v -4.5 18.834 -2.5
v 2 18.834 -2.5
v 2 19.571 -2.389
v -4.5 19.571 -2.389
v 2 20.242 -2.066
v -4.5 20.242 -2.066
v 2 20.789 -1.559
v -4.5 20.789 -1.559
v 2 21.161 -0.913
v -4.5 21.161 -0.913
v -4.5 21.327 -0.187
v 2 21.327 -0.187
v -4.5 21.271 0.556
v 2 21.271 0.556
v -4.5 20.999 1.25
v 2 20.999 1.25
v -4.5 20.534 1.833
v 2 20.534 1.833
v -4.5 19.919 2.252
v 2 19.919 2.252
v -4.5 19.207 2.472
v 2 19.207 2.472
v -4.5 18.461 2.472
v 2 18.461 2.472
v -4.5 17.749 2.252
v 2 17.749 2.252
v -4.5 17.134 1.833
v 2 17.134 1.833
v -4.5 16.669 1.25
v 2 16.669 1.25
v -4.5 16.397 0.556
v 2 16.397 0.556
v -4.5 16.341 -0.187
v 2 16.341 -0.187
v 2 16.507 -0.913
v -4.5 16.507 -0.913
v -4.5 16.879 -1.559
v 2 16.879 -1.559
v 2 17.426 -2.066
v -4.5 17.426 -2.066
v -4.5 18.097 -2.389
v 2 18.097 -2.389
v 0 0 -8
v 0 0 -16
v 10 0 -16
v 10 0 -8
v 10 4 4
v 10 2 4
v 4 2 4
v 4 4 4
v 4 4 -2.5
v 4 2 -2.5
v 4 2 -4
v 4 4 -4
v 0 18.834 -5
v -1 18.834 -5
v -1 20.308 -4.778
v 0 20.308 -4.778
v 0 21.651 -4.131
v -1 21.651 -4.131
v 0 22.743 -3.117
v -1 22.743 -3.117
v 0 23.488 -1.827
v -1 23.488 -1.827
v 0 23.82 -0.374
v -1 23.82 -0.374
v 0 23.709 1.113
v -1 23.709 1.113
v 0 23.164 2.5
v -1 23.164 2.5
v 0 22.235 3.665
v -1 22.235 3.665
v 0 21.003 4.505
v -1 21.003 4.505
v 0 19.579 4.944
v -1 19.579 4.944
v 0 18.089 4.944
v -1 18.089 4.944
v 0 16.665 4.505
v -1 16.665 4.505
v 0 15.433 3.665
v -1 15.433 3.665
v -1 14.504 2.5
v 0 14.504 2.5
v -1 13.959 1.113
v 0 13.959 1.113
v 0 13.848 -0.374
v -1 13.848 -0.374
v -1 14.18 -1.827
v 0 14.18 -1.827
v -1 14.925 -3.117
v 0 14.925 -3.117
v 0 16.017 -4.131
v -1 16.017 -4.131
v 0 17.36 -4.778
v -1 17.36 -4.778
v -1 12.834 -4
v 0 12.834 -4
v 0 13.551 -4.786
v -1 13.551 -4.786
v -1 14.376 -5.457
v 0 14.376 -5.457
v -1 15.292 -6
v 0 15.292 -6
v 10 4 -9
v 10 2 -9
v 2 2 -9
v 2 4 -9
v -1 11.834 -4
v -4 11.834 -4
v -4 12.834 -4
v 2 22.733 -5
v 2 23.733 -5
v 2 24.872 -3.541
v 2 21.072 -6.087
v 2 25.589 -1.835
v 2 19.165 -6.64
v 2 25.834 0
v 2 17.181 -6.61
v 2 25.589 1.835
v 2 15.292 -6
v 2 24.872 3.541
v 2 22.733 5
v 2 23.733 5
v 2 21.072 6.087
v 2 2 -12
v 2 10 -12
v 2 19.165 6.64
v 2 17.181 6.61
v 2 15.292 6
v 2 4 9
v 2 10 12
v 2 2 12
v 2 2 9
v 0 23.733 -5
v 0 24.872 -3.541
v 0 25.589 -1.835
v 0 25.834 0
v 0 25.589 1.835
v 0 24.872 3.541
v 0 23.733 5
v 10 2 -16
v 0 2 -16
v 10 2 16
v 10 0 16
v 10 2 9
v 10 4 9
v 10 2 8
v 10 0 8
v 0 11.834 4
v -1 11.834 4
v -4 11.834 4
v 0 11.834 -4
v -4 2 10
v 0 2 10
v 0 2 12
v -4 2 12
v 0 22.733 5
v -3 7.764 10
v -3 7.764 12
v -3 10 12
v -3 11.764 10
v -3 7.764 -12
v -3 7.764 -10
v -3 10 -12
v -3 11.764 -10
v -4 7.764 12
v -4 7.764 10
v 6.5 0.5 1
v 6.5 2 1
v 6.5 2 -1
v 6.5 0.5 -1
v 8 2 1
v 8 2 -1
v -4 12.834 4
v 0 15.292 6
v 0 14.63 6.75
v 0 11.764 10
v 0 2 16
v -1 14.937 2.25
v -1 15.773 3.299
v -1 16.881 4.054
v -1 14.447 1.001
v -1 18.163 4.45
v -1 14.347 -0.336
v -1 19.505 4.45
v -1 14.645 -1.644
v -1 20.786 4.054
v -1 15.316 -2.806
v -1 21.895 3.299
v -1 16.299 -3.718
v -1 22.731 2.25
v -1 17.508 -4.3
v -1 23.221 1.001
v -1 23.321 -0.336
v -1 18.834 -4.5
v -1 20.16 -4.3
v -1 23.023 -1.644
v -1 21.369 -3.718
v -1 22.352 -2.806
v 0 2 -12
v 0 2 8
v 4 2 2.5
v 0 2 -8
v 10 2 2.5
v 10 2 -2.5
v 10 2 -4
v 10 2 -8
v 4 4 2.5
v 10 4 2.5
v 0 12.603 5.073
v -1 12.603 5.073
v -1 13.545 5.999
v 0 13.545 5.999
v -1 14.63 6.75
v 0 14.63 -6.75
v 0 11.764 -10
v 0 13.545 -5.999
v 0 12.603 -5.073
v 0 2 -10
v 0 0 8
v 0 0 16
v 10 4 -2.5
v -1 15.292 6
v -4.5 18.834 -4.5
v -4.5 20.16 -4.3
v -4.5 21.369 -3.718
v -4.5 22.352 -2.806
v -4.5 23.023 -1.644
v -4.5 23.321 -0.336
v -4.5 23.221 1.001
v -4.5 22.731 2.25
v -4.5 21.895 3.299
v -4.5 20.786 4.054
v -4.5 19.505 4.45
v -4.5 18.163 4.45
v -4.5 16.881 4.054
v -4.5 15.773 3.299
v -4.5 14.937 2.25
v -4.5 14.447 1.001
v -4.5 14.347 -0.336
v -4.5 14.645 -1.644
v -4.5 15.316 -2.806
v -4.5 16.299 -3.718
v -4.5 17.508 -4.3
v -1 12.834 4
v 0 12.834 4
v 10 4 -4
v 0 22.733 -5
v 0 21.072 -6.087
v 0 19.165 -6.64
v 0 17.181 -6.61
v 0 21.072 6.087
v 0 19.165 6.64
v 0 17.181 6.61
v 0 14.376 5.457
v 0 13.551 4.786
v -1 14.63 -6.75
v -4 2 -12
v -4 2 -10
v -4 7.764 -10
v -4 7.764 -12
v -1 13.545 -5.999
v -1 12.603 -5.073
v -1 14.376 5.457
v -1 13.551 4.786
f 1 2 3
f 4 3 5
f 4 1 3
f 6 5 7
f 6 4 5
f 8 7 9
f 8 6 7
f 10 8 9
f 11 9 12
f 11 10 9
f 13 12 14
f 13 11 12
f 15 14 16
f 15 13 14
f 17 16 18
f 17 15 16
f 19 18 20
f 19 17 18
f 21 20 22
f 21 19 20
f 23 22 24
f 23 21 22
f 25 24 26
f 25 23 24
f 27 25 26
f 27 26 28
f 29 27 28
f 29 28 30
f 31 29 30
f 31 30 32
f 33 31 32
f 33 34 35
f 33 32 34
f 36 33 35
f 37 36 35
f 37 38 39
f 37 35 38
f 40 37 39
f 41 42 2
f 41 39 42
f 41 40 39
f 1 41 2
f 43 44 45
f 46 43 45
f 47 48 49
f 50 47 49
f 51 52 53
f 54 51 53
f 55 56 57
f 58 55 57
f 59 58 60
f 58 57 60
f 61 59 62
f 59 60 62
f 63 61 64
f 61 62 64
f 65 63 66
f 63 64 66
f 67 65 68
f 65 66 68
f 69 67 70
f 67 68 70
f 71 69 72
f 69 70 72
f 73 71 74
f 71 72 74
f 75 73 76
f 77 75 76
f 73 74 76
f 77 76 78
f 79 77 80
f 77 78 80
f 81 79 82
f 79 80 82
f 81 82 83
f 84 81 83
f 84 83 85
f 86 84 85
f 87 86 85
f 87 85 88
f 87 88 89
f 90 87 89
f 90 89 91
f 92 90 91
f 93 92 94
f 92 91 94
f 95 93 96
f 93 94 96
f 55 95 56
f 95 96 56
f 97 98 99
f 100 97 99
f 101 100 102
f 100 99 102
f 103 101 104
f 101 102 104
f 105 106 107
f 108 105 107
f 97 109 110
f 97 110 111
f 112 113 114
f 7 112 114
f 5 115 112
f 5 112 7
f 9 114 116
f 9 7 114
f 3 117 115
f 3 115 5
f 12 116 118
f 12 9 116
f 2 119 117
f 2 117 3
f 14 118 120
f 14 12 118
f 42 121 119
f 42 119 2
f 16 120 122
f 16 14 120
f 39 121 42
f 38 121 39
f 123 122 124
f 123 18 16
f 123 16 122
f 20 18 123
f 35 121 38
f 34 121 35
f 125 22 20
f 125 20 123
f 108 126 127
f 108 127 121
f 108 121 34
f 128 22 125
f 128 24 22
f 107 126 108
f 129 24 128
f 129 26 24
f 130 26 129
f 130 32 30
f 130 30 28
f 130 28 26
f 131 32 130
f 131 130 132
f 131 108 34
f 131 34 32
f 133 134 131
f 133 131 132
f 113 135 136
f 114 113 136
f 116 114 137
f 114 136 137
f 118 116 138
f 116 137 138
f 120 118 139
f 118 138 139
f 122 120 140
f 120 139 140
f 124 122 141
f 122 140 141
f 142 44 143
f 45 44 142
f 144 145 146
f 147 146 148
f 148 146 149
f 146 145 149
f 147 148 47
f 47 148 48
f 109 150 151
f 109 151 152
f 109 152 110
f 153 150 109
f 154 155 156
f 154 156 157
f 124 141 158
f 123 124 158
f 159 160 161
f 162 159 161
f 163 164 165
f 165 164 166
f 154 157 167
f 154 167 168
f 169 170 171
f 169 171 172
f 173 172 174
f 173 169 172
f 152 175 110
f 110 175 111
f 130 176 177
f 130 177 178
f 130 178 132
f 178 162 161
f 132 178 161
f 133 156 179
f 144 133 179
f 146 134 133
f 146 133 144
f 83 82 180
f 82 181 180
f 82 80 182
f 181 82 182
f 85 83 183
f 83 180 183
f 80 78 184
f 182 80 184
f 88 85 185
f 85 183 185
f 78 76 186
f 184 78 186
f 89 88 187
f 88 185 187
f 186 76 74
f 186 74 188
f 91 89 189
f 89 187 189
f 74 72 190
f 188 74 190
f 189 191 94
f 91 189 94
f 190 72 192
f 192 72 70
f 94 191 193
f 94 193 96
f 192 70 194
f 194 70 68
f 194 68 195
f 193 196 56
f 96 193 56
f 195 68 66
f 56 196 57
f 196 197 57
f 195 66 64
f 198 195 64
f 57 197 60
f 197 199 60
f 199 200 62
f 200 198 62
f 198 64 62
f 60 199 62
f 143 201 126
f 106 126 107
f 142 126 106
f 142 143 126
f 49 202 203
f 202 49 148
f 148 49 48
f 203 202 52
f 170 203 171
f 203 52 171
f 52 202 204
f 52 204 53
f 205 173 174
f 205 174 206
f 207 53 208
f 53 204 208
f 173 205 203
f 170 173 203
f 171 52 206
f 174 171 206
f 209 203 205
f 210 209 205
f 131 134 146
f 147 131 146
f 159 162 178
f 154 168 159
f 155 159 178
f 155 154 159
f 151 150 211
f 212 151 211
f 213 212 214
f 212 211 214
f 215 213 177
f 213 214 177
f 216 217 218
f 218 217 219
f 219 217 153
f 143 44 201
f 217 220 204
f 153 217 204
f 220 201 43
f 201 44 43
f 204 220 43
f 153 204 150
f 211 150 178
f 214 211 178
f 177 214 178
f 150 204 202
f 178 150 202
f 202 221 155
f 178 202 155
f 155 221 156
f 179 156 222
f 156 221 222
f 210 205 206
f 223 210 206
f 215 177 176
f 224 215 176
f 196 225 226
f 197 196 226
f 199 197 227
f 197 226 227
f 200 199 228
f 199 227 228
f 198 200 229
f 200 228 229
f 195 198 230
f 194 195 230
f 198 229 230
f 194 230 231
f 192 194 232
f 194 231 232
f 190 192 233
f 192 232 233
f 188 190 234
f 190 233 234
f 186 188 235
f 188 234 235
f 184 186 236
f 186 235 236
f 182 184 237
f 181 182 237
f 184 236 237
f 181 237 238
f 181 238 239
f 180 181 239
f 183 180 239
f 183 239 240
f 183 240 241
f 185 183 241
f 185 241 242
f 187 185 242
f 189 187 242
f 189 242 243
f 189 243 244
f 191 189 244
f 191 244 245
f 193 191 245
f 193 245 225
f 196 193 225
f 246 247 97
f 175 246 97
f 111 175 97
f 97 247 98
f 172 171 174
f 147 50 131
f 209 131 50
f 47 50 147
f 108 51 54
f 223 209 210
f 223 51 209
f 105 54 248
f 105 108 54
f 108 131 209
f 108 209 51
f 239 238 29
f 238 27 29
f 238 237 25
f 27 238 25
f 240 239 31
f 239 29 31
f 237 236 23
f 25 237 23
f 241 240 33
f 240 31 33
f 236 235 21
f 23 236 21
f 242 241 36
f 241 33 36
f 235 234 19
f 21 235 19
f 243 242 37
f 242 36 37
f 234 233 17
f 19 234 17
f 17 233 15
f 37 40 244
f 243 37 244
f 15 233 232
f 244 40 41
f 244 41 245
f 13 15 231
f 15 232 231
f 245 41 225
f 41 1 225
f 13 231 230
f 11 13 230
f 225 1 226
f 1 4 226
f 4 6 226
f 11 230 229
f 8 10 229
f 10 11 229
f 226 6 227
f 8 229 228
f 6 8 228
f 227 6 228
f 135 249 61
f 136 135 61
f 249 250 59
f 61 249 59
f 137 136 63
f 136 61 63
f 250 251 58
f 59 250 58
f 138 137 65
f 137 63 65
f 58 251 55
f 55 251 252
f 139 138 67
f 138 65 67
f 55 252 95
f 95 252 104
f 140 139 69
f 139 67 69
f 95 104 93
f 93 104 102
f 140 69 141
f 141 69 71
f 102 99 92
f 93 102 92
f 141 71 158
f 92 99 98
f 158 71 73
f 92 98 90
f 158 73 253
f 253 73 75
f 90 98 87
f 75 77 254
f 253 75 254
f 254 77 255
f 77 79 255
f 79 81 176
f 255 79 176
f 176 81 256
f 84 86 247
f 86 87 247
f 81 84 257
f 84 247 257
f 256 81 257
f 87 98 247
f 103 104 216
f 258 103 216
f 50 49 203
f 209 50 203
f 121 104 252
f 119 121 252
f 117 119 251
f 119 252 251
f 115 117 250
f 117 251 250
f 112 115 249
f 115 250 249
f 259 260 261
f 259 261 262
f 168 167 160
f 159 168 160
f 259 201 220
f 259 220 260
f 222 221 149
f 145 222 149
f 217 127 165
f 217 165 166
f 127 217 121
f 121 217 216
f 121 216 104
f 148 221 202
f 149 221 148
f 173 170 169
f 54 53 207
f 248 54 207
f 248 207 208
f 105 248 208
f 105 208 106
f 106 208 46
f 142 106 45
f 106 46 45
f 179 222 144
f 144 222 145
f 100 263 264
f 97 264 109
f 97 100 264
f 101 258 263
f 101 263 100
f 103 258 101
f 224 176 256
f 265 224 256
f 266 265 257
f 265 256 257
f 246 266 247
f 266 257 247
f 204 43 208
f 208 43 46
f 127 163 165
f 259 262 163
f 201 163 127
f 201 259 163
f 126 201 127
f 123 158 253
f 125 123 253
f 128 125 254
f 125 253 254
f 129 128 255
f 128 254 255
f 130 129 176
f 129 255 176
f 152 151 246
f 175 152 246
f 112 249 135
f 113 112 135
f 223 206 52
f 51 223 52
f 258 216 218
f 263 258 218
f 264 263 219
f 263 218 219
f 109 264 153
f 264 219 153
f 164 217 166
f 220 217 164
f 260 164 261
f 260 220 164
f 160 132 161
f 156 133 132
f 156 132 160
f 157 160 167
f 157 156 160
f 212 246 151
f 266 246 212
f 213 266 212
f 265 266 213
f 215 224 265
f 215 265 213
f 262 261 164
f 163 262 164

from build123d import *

# Parameters (mm, degrees)
SCHIZZO2_W                     = 10
SCHIZZO2_H                     = 8
ESTRUSIONE_ESTRUSIONE1_DEPTH   = 2
ESTRUSIONE_ESTRUSIONE1_2_DEPTH = 2
ESTRUSIONE_ESTRUSIONE2_DEPTH   = 2
ESTRUSIONE_ESTRUSIONE3_DEPTH   = 26
TAGLIO_ESTRUSIONE1_DEPTH       = 34.763886032
TAGLIO_ESTRUSIONE1_DEPTH_BACK  = 34.763886032
TAGLIO_ESTRUSIONE2_DEPTH       = 32.990517073
TAGLIO_ESTRUSIONE2_DEPTH_BACK  = 32.990517073
SCHIZZO8_R                     = 2.5
ESTRUSIONE_ESTRUSIONE4_DEPTH   = 1
SCHIZZO11_W                    = 8
SCHIZZO11_H                    = 1
ESTRUSIONE_ESTRUSIONE5_DEPTH   = 4
ESTRUSIONE_ESTRUSIONE6_START   = -4.5
SCHIZZO12_R                    = 4.5
SCHIZZO12_R_2                  = 2.5
ESTRUSIONE_ESTRUSIONE6_DEPTH   = 4.5
ESTRUSIONE_ESTRUSIONE7_START   = -1
SCHIZZO13_R                    = 5
SCHIZZO13_R_2                  = 4.5
ESTRUSIONE_ESTRUSIONE7_DEPTH   = 1
TAGLIO_ESTRUSIONE3_START       = 12
SCHIZZO14_W                    = 1
SCHIZZO14_H                    = 4
TAGLIO_ESTRUSIONE3_DEPTH       = 44.990517073
ESTRUSIONE_ESTRUSIONE8_DEPTH   = 1


with BuildPart() as part:
    # Schizzo2 → Estrusione-Estrusione1 (new body)
    with BuildSketch(Plane(origin=(0, 0, 0), x_dir=(1, 0, 0), z_dir=(0, 1, 0))):
        with Locations((5, 12)):
            Rectangle(SCHIZZO2_W, SCHIZZO2_H)
    extrude(amount=ESTRUSIONE_ESTRUSIONE1_DEPTH)



with BuildPart() as body_2:
    # Schizzo2 → Estrusione-Estrusione1 2 (new body)
    with BuildSketch(Plane(origin=(0, 0, 0), x_dir=(1, 0, 0), z_dir=(0, 1, 0))):
        with Locations((5, -12)):
            Rectangle(SCHIZZO2_W, SCHIZZO2_H)
    extrude(amount=ESTRUSIONE_ESTRUSIONE1_2_DEPTH)


with BuildPart() as part_1:
    add(part.part)

    add(body_2.part)  # Estrusione-Estrusione2 merges body 2
    # Schizzo3 → Estrusione-Estrusione2 (add)
    with BuildSketch(Plane(origin=(0, 2, 0), x_dir=(1, 0, 0), z_dir=(0, 1, 0))):
        Polygon((0, -9), (10, -9), (10, -4), (4, -4), (4, -2.5), (10, -2.5), (10, 2.5), (4, 2.5), (4, 4), (10, 4), (10, 9), (0, 9), align=None)
    extrude(amount=ESTRUSIONE_ESTRUSIONE2_DEPTH)

    # Schizzo5 → Estrusione-Estrusione3 (add)
    with BuildSketch(Plane(origin=(0, 2, 0), x_dir=(1, 0, 0), z_dir=(0, 1, 0))):
        Polygon((-4, 12), (2, 12), (2, -12), (-4, -12), (-4, -10), (0, -10), (0, 10), (-4, 10), align=None)
    extrude(amount=ESTRUSIONE_ESTRUSIONE3_DEPTH)

    # Schizzo6 → Taglio-Estrusione1 (cut, two sides: drawn at the far end of the back side and taken through both)
    with BuildSketch(Plane(origin=(0, 0, 0), x_dir=(0, 0, -1), z_dir=(1, 0, 0)).offset(-TAGLIO_ESTRUSIONE1_DEPTH_BACK)):
        with BuildLine():
            Line((-12, 10), (-12, 28))
            Line((-12, 28), (12, 28))
            Line((12, 28), (12, 10))
            Line((12, 10), (6, 15.291502622))
            ThreePointArc((6, 15.291502622), (6.640310502, 19.165456154), (5, 22.732933549))
            Line((5, 22.732933549), (5, 23.732933549))
            ThreePointArc((5, 23.732933549), (0, 25.833954064), (-5, 23.732933549))
            Line((-5, 23.732933549), (-5, 22.732933549))
            ThreePointArc((-5, 22.732933549), (-6.640310502, 19.165456154), (-6, 15.291502622))
            Line((-6, 15.291502622), (-12, 10))
        make_face()
    extrude(amount=TAGLIO_ESTRUSIONE1_DEPTH + TAGLIO_ESTRUSIONE1_DEPTH_BACK, mode=Mode.SUBTRACT)

    # Schizzo8 → Taglio-Estrusione2 (cut, two sides: drawn at the far end of the back side and taken through both)
    with BuildSketch(Plane(origin=(0, 0, 0), x_dir=(0, 0, -1), z_dir=(1, 0, 0)).offset(-TAGLIO_ESTRUSIONE2_DEPTH_BACK)):
        with Locations((0, 18.833954064)):
            Circle(SCHIZZO8_R)
    extrude(amount=TAGLIO_ESTRUSIONE2_DEPTH + TAGLIO_ESTRUSIONE2_DEPTH_BACK, mode=Mode.SUBTRACT)

    # Schizzo9 → Estrusione-Estrusione4 (add, symmetric)
    with BuildSketch(Plane.XY):
        Polygon((8, 2), (6.5, 2), (6.5, 0.5), align=None)
    extrude(amount=ESTRUSIONE_ESTRUSIONE4_DEPTH, both=True)

    # Schizzo11 → Estrusione-Estrusione5 (add)
    with BuildSketch(Plane(origin=(0, 0, 0), x_dir=(0, 0, -1), z_dir=(1, 0, 0))):
        with Locations((0, 12.333954064)):
            Rectangle(SCHIZZO11_W, SCHIZZO11_H)
    extrude(amount=-ESTRUSIONE_ESTRUSIONE5_DEPTH)

    # Schizzo12 → Estrusione-Estrusione6 (add)
    with BuildSketch(Plane(origin=(0, 0, 0), x_dir=(0, 0, -1), z_dir=(1, 0, 0)).offset(ESTRUSIONE_ESTRUSIONE6_START)):
        with Locations((0, 18.833954064)):
            Circle(SCHIZZO12_R)
        with Locations((0, 18.833954064)):
            Circle(SCHIZZO12_R_2, mode=Mode.SUBTRACT)
    extrude(amount=ESTRUSIONE_ESTRUSIONE6_DEPTH)

    # Schizzo13 → Estrusione-Estrusione7 (add)
    with BuildSketch(Plane(origin=(0, 0, 0), x_dir=(0, 0, -1), z_dir=(1, 0, 0)).offset(ESTRUSIONE_ESTRUSIONE7_START)):
        with Locations((0, 18.833954064)):
            Circle(SCHIZZO13_R)
        with Locations((0, 18.833954064)):
            Circle(SCHIZZO13_R_2, mode=Mode.SUBTRACT)
    extrude(amount=ESTRUSIONE_ESTRUSIONE7_DEPTH)

    # Schizzo14 → Taglio-Estrusione3 (cut, through all)
    with BuildSketch(Plane.XY.offset(TAGLIO_ESTRUSIONE3_START)):
        with Locations((-3.5, 9.763834207)):
            Rectangle(SCHIZZO14_W, SCHIZZO14_H)
    extrude(amount=-TAGLIO_ESTRUSIONE3_DEPTH, mode=Mode.SUBTRACT)

    # Schizzo17 → Estrusione-Estrusione8 (add)
    with BuildSketch(Plane(origin=(0, 0, 0), x_dir=(0, 0, -1), z_dir=(1, 0, 0))):
        with BuildLine():
            Line((6, 15.291502622), (6.75, 14.630064794))
            ThreePointArc((6.75, 14.630064794), (5.555843379, 13.054148343), (4, 11.833954064))
            Line((4, 11.833954064), (4, 12.833954064))
            ThreePointArc((4, 12.833954064), (5.136905867, 13.951311731), (6, 15.291502622))
        make_face()
        with BuildLine():
            Line((-6.75, 14.630064794), (-6, 15.291502622))
            ThreePointArc((-6, 15.291502622), (-5.136905867, 13.951311731), (-4, 12.833954064))
            Line((-4, 12.833954064), (-4, 11.833954064))
            ThreePointArc((-4, 11.833954064), (-5.555843379, 13.054148343), (-6.75, 14.630064794))
        make_face()
    extrude(amount=-ESTRUSIONE_ESTRUSIONE8_DEPTH)


solid = part_1.part
